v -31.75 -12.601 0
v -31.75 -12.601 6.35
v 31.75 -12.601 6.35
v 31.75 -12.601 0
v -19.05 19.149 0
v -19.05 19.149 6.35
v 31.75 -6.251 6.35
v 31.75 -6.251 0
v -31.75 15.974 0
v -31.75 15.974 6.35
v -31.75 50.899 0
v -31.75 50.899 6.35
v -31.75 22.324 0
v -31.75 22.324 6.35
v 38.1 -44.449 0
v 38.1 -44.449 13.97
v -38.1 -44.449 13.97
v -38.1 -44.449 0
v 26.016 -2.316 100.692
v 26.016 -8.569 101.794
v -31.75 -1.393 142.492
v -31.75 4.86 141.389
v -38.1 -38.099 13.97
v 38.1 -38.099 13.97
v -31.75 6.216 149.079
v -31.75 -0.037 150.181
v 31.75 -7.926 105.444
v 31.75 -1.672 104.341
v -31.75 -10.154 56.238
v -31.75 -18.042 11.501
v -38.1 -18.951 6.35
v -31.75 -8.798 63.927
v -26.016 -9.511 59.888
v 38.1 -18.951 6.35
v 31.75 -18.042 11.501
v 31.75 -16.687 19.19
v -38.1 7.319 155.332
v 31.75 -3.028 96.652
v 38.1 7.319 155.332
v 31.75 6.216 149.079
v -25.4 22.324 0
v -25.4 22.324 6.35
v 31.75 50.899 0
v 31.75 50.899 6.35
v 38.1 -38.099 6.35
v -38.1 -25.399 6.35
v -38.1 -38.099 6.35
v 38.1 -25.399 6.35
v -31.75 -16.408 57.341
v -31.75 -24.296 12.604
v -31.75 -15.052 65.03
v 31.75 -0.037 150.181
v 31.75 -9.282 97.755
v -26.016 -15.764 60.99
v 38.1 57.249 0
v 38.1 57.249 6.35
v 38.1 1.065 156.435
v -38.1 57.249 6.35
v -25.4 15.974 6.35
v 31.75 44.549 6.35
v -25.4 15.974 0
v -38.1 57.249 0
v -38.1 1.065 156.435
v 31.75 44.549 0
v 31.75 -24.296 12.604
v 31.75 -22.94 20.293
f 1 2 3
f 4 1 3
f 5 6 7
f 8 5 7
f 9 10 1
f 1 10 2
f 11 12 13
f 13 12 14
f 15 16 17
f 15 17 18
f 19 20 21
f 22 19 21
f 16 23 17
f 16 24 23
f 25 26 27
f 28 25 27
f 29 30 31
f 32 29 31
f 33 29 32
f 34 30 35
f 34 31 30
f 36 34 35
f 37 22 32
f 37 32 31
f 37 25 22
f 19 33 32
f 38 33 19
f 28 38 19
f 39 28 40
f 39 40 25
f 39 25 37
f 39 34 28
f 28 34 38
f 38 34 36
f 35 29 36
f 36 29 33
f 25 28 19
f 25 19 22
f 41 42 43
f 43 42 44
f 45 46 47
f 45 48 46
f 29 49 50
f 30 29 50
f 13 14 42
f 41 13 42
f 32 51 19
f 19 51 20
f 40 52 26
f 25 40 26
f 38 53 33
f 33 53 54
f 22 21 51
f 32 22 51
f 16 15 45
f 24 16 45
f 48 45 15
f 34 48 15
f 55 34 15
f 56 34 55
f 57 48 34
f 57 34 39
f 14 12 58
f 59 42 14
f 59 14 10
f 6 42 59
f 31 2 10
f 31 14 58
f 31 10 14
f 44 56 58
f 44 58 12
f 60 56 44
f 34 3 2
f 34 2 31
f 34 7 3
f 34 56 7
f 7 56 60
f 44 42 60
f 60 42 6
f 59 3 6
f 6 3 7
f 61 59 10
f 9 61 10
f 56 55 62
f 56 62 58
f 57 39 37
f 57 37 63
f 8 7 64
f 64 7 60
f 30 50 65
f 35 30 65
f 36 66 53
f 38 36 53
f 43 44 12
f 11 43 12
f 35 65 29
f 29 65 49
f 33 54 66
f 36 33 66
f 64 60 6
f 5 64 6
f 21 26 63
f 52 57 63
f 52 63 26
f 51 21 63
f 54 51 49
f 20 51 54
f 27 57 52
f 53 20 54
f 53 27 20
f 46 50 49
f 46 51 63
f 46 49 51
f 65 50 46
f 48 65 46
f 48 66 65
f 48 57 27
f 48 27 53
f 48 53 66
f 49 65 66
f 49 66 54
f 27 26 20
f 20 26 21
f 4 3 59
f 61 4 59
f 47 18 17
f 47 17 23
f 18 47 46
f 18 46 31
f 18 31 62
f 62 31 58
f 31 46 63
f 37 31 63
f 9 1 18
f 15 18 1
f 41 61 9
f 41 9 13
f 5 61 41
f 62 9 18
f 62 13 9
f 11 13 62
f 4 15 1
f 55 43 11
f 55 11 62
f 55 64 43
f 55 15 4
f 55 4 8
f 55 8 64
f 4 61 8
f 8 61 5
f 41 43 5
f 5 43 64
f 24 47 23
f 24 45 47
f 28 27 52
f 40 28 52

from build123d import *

# Parameters (mm, degrees)
F1_DEPTH = 38.1
F3_DEPTH = 25.4
F5_DEPTH = 6.35


with BuildPart() as f1:
    # F0 (on Right) → F1 (new body, symmetric)
    with BuildSketch(Plane.YZ):
        Polygon((-38.0986895752, 13.97), (-44.4486895752, 13.97), (-44.4486895752, 0), (57.2492694102, 0), (57.2492694102, 6.35), (-18.9507305898, 6.35), (7.3188219328, 155.3320356309), (1.0652927012, 156.4347015591), (-25.3986895752, 6.35), (-38.0986895752, 6.35), align=None)
    extrude(amount=F1_DEPTH, both=True)

    # F2 (on face) → F3 (cut)
    with BuildSketch(Plane.XY.offset(6.35)):
        Polygon((-31.75, -12.6007305898), (31.75, -12.6007305898), (-25.4, 15.9742694102), (-31.75, 15.9742694102), align=None)
        Polygon((31.75, -6.2507305898), (31.75, 44.5492694102), (-19.05, 19.1492694102), align=None)
        Polygon((-25.4, 22.3242694102), (31.75, 50.8992694102), (-31.75, 50.8992694102), (-31.75, 22.3242694102), align=None)
    extrude(amount=-F3_DEPTH, mode=Mode.SUBTRACT)

    # F4 (on face) → F5 (cut, through all)
    with BuildSketch(Plane(origin=(0, -25.7187393284, 4.5349076534), x_dir=(1, 0, 0), z_dir=(0, -0.984807753, 0.1736481777))):
        Polygon((31.75, 147.8930930718), (-31.75, 147.8930930718), (31.75, 102.4655281848), align=None)
        Polygon((26.0160516338, 98.7599313647), (-31.75, 140.0854598506), (-31.75, 61.4282911798), align=None)
        Polygon((31.75, 16.0007262929), (31.75, 94.6578949637), (-26.0160516338, 57.3262547788), align=None)
        Polygon((31.75, 8.1930930718), (-31.75, 53.6206579587), (-31.75, 8.1930930718), align=None)
    extrude(amount=-F5_DEPTH, mode=Mode.SUBTRACT)


solid = f1.part
